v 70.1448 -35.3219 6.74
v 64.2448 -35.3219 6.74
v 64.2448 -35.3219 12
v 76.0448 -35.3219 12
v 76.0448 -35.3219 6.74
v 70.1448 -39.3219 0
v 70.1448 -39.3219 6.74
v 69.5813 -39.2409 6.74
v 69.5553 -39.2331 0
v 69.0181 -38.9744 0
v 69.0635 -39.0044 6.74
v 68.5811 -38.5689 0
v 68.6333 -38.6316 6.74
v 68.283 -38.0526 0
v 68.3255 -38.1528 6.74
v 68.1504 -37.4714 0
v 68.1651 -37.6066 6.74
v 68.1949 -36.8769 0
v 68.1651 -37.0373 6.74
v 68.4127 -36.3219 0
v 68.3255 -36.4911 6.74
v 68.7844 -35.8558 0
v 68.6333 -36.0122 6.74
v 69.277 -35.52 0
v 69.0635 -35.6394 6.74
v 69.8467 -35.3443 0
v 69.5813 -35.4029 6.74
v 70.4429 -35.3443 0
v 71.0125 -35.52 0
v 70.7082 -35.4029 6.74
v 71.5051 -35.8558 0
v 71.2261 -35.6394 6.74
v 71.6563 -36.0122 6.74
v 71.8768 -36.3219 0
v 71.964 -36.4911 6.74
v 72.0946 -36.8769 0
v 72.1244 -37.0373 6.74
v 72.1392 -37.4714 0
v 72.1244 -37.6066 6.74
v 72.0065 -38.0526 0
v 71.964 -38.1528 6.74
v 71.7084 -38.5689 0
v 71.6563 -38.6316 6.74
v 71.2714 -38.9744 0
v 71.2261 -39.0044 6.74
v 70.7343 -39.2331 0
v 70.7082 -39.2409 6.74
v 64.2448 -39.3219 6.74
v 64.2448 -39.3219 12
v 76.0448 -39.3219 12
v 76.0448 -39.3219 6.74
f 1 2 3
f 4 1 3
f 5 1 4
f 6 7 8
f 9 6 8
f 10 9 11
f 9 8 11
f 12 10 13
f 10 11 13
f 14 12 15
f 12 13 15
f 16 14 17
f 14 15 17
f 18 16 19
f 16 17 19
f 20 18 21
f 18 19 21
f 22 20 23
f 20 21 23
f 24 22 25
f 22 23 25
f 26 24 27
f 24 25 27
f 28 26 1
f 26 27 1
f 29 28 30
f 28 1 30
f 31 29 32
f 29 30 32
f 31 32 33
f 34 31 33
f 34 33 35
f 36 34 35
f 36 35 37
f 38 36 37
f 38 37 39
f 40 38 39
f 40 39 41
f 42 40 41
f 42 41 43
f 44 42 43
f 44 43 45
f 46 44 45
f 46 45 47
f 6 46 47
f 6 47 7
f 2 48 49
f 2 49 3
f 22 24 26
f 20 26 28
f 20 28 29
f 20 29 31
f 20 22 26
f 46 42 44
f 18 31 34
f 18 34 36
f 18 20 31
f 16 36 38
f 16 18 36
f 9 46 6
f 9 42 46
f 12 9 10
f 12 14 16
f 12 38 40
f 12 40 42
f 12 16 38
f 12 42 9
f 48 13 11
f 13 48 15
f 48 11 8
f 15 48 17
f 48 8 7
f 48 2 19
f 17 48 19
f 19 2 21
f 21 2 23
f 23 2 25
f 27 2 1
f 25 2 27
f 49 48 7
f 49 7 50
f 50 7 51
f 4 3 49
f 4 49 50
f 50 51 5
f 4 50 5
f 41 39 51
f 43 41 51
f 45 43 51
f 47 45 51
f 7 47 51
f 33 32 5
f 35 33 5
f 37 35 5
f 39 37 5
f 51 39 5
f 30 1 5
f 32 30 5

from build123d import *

# Parameters (mm, degrees)
ESBO_O4_W                = 11.8
ESBO_O4_H                = 4
RESSALTO_EXTRUS_O2_DEPTH = 5.26
ESBO_O5_R                = 2
RESSALTO_EXTRUS_O4_DEPTH = 6.74


with BuildPart() as part:
    # Esboço4 → Ressalto-extrusão2 (new body)
    with BuildSketch(Plane.XY.offset(6.74)):
        with Locations((70.144771166, -37.321923077)):
            Rectangle(ESBO_O4_W, ESBO_O4_H)
    extrude(amount=RESSALTO_EXTRUS_O2_DEPTH)

    # Esboço5 → Ressalto-extrusão4 (add)
    with BuildSketch(Plane(origin=(0, 0, 6.74), x_dir=(-1, 0, 0), z_dir=(0, 0, -1))):
        with Locations(Location((-70.144771166, -37.321923077, 0), (0, 0, 270))):
            Circle(ESBO_O5_R)
    extrude(amount=RESSALTO_EXTRUS_O4_DEPTH)


solid = part.part
